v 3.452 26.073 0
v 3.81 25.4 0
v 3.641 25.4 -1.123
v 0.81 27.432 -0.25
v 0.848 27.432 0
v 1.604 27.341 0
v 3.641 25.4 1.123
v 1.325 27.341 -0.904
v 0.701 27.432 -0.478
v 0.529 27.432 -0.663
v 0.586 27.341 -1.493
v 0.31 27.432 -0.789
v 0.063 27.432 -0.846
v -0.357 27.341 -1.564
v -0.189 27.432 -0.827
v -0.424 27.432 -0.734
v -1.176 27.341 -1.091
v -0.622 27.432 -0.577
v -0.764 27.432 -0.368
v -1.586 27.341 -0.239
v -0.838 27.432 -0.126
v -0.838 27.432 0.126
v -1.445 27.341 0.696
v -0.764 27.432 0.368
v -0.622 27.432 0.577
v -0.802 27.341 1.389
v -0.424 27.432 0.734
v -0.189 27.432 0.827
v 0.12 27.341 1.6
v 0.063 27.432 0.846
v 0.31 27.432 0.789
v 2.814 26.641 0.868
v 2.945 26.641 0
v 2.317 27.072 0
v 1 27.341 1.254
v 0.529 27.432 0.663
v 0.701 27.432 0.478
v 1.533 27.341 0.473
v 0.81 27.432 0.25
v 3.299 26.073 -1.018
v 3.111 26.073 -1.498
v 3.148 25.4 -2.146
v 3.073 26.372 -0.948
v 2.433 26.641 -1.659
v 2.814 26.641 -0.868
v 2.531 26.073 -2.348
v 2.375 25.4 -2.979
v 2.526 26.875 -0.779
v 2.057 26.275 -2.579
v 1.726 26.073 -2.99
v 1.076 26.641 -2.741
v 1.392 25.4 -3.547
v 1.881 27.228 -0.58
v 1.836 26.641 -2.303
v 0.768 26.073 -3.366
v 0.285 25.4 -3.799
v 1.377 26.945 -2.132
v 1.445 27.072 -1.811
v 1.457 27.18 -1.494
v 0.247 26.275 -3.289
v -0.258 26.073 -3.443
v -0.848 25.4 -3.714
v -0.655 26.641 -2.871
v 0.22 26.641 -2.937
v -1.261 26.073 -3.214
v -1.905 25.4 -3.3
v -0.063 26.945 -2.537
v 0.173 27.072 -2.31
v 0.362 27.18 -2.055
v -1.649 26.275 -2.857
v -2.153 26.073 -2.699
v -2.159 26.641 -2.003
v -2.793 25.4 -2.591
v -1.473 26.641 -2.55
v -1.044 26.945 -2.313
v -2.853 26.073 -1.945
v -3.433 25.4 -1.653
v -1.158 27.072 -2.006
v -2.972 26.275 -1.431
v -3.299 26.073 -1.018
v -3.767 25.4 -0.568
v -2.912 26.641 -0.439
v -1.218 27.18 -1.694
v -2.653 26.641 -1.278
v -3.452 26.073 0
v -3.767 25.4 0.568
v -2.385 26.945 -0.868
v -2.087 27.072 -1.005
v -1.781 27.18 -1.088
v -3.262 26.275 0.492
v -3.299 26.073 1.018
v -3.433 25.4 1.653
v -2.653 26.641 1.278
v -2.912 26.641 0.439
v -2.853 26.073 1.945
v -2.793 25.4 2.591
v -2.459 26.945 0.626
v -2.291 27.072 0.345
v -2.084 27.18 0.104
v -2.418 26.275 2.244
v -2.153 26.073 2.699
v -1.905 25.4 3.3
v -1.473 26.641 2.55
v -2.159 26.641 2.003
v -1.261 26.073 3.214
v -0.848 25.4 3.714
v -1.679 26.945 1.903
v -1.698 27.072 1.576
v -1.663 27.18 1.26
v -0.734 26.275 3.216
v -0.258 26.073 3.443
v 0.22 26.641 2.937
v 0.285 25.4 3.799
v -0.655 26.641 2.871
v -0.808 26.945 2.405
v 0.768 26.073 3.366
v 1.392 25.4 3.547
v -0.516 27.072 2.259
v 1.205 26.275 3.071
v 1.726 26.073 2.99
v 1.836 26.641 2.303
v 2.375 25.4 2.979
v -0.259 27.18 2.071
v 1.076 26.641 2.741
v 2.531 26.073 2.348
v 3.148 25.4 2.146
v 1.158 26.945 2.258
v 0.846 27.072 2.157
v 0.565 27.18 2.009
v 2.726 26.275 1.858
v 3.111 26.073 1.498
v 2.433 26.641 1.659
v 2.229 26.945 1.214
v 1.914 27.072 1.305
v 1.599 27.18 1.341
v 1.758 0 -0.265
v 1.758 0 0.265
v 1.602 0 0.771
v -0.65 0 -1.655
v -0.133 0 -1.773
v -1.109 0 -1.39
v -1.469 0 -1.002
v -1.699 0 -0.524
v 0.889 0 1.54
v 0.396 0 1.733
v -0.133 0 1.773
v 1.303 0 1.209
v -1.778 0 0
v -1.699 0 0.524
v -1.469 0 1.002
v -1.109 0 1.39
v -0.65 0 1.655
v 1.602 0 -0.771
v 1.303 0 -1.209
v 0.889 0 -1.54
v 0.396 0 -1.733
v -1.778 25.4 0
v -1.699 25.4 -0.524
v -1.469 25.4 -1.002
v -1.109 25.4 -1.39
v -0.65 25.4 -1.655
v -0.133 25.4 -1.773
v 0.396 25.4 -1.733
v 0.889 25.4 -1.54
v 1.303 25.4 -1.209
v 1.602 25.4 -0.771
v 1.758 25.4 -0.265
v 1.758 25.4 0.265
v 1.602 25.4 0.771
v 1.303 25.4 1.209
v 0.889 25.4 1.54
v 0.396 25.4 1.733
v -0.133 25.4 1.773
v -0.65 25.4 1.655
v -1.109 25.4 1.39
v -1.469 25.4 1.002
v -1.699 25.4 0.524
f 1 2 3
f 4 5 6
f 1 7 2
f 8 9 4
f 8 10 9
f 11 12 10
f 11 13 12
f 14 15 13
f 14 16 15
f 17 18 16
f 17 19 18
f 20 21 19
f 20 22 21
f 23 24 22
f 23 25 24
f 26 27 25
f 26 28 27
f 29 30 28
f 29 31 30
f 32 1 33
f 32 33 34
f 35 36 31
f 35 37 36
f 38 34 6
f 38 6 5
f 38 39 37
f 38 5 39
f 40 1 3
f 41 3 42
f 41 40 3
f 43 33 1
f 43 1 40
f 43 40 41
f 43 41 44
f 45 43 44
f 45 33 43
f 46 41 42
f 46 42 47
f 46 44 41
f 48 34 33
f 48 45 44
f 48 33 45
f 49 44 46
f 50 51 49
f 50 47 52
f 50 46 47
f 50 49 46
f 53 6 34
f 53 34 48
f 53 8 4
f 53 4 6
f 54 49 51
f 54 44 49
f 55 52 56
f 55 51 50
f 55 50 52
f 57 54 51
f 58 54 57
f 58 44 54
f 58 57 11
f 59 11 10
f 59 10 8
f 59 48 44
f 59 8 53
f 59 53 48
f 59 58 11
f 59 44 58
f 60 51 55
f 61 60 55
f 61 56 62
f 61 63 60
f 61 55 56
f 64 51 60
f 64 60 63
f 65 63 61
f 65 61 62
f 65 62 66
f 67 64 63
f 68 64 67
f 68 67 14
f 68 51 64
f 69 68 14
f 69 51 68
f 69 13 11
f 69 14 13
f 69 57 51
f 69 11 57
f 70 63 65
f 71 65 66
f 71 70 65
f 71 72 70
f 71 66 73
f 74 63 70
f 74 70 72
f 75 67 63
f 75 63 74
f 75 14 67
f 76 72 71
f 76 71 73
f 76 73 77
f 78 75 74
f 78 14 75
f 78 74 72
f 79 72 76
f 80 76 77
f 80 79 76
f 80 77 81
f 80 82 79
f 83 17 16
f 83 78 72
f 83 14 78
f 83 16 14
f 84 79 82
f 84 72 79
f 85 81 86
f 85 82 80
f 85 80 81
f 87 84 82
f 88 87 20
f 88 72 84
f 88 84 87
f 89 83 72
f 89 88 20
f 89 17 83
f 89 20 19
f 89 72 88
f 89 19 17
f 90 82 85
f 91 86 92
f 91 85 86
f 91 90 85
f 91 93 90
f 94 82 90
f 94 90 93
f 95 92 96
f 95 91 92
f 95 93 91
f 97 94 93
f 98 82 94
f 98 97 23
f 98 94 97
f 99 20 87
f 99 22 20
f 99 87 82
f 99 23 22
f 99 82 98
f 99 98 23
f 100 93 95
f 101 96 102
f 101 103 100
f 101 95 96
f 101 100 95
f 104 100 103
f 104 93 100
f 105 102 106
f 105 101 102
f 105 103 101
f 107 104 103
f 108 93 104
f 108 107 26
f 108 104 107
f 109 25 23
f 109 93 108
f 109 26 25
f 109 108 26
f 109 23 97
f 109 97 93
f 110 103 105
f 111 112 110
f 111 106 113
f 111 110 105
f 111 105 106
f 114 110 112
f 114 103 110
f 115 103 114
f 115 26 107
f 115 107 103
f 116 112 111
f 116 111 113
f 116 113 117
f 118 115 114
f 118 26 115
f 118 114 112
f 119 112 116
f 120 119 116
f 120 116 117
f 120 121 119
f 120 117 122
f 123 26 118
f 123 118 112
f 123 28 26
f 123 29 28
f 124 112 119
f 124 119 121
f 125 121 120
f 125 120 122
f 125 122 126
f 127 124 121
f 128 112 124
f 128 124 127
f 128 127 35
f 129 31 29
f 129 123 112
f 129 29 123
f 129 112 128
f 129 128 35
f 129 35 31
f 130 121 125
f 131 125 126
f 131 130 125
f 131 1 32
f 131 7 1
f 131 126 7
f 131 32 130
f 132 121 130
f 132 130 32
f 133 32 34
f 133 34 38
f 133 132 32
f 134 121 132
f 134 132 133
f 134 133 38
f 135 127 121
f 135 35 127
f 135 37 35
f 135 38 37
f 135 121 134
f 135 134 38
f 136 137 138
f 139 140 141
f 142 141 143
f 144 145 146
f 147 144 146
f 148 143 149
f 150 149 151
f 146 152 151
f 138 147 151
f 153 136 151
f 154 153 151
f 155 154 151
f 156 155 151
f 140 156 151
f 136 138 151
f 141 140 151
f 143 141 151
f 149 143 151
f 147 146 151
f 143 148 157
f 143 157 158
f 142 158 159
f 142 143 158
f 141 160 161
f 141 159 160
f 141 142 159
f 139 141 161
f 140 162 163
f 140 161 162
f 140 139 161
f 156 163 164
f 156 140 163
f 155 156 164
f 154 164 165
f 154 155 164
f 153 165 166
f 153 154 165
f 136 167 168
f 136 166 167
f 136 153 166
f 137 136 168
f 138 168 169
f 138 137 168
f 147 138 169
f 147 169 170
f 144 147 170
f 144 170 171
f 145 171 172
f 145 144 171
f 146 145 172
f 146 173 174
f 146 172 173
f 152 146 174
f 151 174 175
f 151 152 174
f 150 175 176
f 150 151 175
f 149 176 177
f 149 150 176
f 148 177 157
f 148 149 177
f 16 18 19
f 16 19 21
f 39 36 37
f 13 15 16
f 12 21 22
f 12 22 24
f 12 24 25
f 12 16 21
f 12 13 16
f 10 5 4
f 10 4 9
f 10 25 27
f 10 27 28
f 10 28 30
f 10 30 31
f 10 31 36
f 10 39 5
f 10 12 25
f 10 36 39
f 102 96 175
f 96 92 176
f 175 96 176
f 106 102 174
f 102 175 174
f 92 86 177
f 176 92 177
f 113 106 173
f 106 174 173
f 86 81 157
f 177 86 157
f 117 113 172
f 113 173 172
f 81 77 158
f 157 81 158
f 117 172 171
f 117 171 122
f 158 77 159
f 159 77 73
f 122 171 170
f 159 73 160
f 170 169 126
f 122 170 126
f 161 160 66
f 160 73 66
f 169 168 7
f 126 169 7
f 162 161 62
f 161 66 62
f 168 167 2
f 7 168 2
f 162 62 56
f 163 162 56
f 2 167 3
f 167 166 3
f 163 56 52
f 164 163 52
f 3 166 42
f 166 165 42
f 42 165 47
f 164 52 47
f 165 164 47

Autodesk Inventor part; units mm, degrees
ref_plane "YZ Plane" through (0, 0, 0) normal (1, 0, 0) x (0, 1, 0)
ref_plane "XZ Plane" through (0, 0, 0) normal (0, 1, 0) x (-1, 0, 0)
ref_plane "XY Plane" through (0, 0, 0) normal (0, 0, 1) x (1, 0, 0)
sketch "Sketch1" plane through (0, 0, 0) normal (0, 1, 0) x (-1, 0, 0)
  circle A0 centre (0, 0) radius 1.778
  dimension "d0" = 3.556
extrude "Extrusion1" add sketch "Sketch1" along normal blind 25.4
sketch "Sketch3" plane through (0, 25.4, 0) normal (0, 1, 0) x (1, 0, 0)
  circle A0 centre (0, 0) radius 3.81
  dimension "d4" = 7.62
extrude "Extrusion2" add sketch "Sketch3" along normal blind 2.032
fillet "Fillet1" radius 3.175 1 edges at (-3.81, 27.432, 0)
properties part number "screw_o.15"
